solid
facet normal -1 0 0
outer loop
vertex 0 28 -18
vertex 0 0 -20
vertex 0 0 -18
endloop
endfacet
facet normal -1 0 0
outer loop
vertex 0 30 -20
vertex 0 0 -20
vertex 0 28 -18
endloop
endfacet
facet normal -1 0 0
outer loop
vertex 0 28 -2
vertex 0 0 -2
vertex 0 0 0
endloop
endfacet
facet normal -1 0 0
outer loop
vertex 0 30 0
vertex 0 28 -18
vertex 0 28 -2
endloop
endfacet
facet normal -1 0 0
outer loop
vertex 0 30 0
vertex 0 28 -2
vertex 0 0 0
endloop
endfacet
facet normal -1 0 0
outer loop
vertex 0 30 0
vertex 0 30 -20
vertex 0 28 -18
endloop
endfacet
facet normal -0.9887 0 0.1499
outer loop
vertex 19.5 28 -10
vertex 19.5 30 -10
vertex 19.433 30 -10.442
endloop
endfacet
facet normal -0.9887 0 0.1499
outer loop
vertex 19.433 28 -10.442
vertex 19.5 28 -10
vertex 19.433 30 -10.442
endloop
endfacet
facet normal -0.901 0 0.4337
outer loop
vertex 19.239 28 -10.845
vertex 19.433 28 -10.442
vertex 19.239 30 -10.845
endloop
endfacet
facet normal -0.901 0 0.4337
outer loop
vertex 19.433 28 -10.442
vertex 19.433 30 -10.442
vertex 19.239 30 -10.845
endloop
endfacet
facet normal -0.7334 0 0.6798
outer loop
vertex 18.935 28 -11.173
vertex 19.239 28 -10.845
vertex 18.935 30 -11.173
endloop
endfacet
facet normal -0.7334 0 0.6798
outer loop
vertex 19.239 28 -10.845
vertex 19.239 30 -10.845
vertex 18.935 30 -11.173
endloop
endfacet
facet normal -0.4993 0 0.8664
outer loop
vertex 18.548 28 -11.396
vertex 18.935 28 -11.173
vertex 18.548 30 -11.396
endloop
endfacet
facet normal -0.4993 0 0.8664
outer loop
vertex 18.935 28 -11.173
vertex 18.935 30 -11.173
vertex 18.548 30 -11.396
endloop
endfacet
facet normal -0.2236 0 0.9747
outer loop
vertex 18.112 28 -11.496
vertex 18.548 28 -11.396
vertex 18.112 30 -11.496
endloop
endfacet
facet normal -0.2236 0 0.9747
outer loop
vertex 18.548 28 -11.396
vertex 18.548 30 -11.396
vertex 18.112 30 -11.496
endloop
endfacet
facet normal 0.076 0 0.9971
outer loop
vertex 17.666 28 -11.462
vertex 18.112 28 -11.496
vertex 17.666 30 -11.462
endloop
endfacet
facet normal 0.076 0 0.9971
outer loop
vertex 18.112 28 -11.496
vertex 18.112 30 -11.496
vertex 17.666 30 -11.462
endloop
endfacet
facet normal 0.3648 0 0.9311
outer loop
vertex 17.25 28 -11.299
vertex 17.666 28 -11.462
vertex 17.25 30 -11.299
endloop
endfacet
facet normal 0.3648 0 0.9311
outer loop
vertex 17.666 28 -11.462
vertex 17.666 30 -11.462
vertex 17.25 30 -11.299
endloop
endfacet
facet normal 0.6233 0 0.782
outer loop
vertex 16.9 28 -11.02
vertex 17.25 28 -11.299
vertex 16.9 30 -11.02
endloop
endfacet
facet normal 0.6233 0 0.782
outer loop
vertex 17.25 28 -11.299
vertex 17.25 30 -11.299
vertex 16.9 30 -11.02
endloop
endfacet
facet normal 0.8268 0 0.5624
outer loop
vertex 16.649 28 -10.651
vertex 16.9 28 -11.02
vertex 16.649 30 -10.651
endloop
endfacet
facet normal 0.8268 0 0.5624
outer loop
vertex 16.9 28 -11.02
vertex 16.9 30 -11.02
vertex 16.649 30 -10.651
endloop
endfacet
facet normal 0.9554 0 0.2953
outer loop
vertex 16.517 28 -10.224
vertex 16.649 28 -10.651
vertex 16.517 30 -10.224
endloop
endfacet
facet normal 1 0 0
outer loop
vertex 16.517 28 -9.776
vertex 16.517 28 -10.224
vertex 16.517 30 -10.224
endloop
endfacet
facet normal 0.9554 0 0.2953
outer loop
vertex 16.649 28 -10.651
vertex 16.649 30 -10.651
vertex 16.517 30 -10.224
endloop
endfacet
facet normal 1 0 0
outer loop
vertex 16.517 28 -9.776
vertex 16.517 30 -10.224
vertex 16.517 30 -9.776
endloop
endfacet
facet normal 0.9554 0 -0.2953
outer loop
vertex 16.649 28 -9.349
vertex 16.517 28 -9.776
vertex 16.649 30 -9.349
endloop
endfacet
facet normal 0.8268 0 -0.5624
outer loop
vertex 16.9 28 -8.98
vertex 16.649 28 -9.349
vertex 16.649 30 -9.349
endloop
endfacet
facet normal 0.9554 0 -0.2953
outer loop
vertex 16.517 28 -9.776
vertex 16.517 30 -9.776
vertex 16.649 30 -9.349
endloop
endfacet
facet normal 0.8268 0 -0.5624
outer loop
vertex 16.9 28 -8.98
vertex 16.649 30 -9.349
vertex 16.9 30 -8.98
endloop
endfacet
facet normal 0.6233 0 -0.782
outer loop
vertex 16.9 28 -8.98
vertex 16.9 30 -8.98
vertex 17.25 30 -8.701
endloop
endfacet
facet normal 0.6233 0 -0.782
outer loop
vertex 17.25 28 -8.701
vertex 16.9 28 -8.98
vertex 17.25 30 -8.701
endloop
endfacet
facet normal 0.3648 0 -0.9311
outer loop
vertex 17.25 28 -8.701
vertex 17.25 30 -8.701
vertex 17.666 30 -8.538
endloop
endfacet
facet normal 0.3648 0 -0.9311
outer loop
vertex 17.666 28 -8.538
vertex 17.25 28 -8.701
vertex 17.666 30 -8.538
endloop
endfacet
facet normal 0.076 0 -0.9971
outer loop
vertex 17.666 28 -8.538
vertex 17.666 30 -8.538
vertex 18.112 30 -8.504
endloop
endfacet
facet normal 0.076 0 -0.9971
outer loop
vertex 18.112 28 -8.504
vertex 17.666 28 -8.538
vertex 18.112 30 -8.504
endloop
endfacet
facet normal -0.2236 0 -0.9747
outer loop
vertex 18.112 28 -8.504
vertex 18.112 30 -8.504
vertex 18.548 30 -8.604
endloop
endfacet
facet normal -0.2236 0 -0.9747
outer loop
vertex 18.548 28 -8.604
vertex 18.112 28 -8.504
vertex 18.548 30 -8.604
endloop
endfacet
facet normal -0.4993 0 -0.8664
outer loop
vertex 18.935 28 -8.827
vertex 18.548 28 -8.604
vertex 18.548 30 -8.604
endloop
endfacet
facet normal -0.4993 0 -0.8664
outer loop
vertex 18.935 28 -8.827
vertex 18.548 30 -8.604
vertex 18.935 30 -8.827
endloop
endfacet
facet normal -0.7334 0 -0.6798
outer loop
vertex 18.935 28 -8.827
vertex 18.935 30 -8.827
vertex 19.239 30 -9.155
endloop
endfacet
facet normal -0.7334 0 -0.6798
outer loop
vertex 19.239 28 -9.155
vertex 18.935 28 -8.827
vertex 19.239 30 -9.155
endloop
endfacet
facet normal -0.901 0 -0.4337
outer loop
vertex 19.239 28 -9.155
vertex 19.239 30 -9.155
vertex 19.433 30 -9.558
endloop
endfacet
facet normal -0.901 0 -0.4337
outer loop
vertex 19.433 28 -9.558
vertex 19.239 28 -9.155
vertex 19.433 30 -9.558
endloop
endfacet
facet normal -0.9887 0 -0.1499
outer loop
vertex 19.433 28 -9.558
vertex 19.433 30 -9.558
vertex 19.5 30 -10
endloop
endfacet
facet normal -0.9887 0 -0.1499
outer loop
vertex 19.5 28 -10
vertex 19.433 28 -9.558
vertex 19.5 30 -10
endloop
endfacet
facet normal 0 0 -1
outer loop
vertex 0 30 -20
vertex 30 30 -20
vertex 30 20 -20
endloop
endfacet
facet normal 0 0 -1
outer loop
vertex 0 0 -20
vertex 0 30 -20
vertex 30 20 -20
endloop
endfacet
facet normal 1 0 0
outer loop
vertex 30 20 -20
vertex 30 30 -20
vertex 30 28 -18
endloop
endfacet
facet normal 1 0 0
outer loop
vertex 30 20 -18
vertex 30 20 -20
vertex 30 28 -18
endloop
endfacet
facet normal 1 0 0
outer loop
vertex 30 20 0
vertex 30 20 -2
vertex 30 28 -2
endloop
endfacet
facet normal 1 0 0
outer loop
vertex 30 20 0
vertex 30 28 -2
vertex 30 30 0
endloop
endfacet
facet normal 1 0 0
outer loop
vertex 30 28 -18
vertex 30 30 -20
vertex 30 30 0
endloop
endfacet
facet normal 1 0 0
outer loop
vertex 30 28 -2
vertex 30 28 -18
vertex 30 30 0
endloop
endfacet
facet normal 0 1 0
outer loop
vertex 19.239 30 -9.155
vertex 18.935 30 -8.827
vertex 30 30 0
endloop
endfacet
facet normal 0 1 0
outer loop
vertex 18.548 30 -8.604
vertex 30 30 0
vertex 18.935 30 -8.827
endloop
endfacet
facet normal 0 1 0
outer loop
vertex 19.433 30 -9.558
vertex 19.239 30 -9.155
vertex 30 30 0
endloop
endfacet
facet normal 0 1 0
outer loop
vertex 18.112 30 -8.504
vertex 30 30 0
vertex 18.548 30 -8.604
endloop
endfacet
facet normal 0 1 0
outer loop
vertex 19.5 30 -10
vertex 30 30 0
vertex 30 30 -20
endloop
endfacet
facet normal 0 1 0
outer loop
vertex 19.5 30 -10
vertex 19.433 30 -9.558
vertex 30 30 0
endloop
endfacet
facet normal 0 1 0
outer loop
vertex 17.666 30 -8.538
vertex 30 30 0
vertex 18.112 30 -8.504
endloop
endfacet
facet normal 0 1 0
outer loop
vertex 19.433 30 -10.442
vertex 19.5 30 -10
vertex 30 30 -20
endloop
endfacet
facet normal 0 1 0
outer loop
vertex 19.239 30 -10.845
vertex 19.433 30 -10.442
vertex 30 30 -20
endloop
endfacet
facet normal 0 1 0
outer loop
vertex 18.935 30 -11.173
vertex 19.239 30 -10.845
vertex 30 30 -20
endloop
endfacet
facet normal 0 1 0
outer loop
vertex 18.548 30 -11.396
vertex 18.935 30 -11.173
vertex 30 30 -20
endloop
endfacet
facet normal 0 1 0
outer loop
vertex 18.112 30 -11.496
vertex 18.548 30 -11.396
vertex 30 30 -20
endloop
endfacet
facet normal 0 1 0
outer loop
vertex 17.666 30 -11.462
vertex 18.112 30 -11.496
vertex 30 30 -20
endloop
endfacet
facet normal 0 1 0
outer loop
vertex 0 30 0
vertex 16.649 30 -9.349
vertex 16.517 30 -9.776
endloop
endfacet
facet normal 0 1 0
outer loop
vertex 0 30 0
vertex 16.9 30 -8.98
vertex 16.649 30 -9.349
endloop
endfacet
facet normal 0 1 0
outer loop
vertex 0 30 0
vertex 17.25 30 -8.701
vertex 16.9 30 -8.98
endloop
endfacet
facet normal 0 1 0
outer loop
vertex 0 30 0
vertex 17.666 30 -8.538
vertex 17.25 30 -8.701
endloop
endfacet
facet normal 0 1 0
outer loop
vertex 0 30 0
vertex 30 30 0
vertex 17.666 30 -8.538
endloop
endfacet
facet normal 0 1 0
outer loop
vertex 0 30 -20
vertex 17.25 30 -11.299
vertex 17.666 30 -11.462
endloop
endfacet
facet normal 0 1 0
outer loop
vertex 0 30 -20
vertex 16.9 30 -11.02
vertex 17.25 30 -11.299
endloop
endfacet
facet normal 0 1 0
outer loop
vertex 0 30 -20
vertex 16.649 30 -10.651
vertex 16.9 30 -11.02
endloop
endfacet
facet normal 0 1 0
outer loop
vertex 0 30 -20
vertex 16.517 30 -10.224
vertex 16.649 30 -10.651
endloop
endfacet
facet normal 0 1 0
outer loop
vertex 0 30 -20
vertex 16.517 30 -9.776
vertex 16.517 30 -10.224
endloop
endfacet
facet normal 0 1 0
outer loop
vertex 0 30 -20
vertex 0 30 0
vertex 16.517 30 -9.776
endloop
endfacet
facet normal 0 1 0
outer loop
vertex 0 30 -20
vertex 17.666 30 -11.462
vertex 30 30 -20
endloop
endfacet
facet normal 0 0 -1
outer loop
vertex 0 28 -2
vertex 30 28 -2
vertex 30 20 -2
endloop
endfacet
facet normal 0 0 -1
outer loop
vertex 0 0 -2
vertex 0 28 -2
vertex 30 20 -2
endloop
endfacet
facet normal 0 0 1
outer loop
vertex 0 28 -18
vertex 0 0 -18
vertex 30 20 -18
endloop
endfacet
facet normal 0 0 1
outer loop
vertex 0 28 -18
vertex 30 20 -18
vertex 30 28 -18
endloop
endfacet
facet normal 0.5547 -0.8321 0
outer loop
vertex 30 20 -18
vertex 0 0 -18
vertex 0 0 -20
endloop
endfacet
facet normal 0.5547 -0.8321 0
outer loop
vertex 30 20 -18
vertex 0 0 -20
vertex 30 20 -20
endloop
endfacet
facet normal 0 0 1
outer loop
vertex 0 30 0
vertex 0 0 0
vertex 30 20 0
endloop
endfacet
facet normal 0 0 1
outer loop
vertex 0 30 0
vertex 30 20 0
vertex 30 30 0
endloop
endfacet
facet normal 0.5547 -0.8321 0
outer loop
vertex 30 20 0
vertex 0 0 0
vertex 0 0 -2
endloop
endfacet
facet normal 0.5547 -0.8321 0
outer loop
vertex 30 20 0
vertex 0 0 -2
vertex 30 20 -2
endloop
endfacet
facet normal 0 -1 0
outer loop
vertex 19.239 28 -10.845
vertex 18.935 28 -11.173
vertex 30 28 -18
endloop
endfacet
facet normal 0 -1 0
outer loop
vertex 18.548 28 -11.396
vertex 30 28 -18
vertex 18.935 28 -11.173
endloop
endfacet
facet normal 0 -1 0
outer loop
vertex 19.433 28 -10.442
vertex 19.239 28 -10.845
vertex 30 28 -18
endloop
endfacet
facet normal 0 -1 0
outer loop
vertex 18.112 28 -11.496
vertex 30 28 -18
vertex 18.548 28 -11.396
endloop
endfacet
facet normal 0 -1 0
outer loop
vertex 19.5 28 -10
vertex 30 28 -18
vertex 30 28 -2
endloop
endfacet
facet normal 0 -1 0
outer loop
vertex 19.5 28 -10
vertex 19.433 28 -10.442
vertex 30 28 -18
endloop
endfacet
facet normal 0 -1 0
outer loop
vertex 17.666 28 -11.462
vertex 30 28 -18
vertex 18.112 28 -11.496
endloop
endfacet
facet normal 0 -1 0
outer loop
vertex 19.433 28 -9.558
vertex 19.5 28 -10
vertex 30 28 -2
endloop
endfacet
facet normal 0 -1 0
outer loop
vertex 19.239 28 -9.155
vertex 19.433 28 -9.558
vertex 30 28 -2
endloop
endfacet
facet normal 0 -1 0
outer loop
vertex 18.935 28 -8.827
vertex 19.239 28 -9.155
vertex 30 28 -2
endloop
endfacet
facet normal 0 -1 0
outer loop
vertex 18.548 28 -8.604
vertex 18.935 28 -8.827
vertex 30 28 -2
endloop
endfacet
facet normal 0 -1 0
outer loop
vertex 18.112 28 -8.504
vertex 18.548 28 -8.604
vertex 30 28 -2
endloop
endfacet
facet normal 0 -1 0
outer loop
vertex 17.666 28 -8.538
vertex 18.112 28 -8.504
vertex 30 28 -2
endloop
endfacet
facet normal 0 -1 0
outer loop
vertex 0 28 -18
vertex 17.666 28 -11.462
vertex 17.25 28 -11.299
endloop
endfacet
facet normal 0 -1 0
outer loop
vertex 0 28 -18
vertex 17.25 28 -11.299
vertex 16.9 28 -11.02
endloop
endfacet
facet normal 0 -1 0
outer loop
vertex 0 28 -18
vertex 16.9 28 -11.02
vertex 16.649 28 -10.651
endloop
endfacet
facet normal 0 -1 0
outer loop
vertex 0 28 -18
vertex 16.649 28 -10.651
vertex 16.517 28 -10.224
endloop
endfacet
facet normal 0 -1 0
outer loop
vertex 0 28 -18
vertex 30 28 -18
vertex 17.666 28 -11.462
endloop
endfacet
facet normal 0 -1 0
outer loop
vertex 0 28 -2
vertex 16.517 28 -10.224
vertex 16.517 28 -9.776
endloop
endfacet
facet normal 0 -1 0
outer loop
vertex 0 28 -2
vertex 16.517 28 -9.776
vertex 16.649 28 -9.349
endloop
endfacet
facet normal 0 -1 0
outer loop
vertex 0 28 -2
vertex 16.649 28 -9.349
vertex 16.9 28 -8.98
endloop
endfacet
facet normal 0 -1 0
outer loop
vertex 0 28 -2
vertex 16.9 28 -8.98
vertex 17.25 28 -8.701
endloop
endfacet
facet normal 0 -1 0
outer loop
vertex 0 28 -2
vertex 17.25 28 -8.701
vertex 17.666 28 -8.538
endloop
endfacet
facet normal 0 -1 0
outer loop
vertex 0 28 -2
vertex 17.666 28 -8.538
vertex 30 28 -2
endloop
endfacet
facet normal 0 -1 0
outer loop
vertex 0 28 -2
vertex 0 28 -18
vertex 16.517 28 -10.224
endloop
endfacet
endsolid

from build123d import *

# Parameters (mm, degrees)
EXTRUDE_1_DEPTH     = 30
CUT_EXTRUDE_1_DEPTH = 21
SKETCH_3_R          = 1.5
CUT_EXTRUDE_2_DEPTH = 31


with BuildPart() as part:
    # Эскиз1 → Вытянуть-Тонкостенный1 (new body)
    with BuildSketch(Plane(origin=(0, 0, 0), x_dir=(0, 0, -1), z_dir=(1, 0, 0))):
        Polygon((0, 0), (0, 30), (20, 30), (20, 0), (18, 0), (18, 28), (2, 28), (2, 0), align=None)
    extrude(amount=EXTRUDE_1_DEPTH)

    # Эскиз2 → Вырез-Вытянуть1 (cut, through all)
    with BuildSketch(Plane.XY):
        Polygon((0, 0), (30, 20), (30, 0), align=None)
    extrude(amount=-CUT_EXTRUDE_1_DEPTH, mode=Mode.SUBTRACT)

    # Эскиз3 → Вырез-Вытянуть2 (cut, through all)
    with BuildSketch(Plane(origin=(0, 30, 0), x_dir=(1, 0, 0), z_dir=(0, 1, 0))):
        with Locations((18, 10)):
            Circle(SKETCH_3_R)
    extrude(amount=-CUT_EXTRUDE_2_DEPTH, mode=Mode.SUBTRACT)


solid = part.part
